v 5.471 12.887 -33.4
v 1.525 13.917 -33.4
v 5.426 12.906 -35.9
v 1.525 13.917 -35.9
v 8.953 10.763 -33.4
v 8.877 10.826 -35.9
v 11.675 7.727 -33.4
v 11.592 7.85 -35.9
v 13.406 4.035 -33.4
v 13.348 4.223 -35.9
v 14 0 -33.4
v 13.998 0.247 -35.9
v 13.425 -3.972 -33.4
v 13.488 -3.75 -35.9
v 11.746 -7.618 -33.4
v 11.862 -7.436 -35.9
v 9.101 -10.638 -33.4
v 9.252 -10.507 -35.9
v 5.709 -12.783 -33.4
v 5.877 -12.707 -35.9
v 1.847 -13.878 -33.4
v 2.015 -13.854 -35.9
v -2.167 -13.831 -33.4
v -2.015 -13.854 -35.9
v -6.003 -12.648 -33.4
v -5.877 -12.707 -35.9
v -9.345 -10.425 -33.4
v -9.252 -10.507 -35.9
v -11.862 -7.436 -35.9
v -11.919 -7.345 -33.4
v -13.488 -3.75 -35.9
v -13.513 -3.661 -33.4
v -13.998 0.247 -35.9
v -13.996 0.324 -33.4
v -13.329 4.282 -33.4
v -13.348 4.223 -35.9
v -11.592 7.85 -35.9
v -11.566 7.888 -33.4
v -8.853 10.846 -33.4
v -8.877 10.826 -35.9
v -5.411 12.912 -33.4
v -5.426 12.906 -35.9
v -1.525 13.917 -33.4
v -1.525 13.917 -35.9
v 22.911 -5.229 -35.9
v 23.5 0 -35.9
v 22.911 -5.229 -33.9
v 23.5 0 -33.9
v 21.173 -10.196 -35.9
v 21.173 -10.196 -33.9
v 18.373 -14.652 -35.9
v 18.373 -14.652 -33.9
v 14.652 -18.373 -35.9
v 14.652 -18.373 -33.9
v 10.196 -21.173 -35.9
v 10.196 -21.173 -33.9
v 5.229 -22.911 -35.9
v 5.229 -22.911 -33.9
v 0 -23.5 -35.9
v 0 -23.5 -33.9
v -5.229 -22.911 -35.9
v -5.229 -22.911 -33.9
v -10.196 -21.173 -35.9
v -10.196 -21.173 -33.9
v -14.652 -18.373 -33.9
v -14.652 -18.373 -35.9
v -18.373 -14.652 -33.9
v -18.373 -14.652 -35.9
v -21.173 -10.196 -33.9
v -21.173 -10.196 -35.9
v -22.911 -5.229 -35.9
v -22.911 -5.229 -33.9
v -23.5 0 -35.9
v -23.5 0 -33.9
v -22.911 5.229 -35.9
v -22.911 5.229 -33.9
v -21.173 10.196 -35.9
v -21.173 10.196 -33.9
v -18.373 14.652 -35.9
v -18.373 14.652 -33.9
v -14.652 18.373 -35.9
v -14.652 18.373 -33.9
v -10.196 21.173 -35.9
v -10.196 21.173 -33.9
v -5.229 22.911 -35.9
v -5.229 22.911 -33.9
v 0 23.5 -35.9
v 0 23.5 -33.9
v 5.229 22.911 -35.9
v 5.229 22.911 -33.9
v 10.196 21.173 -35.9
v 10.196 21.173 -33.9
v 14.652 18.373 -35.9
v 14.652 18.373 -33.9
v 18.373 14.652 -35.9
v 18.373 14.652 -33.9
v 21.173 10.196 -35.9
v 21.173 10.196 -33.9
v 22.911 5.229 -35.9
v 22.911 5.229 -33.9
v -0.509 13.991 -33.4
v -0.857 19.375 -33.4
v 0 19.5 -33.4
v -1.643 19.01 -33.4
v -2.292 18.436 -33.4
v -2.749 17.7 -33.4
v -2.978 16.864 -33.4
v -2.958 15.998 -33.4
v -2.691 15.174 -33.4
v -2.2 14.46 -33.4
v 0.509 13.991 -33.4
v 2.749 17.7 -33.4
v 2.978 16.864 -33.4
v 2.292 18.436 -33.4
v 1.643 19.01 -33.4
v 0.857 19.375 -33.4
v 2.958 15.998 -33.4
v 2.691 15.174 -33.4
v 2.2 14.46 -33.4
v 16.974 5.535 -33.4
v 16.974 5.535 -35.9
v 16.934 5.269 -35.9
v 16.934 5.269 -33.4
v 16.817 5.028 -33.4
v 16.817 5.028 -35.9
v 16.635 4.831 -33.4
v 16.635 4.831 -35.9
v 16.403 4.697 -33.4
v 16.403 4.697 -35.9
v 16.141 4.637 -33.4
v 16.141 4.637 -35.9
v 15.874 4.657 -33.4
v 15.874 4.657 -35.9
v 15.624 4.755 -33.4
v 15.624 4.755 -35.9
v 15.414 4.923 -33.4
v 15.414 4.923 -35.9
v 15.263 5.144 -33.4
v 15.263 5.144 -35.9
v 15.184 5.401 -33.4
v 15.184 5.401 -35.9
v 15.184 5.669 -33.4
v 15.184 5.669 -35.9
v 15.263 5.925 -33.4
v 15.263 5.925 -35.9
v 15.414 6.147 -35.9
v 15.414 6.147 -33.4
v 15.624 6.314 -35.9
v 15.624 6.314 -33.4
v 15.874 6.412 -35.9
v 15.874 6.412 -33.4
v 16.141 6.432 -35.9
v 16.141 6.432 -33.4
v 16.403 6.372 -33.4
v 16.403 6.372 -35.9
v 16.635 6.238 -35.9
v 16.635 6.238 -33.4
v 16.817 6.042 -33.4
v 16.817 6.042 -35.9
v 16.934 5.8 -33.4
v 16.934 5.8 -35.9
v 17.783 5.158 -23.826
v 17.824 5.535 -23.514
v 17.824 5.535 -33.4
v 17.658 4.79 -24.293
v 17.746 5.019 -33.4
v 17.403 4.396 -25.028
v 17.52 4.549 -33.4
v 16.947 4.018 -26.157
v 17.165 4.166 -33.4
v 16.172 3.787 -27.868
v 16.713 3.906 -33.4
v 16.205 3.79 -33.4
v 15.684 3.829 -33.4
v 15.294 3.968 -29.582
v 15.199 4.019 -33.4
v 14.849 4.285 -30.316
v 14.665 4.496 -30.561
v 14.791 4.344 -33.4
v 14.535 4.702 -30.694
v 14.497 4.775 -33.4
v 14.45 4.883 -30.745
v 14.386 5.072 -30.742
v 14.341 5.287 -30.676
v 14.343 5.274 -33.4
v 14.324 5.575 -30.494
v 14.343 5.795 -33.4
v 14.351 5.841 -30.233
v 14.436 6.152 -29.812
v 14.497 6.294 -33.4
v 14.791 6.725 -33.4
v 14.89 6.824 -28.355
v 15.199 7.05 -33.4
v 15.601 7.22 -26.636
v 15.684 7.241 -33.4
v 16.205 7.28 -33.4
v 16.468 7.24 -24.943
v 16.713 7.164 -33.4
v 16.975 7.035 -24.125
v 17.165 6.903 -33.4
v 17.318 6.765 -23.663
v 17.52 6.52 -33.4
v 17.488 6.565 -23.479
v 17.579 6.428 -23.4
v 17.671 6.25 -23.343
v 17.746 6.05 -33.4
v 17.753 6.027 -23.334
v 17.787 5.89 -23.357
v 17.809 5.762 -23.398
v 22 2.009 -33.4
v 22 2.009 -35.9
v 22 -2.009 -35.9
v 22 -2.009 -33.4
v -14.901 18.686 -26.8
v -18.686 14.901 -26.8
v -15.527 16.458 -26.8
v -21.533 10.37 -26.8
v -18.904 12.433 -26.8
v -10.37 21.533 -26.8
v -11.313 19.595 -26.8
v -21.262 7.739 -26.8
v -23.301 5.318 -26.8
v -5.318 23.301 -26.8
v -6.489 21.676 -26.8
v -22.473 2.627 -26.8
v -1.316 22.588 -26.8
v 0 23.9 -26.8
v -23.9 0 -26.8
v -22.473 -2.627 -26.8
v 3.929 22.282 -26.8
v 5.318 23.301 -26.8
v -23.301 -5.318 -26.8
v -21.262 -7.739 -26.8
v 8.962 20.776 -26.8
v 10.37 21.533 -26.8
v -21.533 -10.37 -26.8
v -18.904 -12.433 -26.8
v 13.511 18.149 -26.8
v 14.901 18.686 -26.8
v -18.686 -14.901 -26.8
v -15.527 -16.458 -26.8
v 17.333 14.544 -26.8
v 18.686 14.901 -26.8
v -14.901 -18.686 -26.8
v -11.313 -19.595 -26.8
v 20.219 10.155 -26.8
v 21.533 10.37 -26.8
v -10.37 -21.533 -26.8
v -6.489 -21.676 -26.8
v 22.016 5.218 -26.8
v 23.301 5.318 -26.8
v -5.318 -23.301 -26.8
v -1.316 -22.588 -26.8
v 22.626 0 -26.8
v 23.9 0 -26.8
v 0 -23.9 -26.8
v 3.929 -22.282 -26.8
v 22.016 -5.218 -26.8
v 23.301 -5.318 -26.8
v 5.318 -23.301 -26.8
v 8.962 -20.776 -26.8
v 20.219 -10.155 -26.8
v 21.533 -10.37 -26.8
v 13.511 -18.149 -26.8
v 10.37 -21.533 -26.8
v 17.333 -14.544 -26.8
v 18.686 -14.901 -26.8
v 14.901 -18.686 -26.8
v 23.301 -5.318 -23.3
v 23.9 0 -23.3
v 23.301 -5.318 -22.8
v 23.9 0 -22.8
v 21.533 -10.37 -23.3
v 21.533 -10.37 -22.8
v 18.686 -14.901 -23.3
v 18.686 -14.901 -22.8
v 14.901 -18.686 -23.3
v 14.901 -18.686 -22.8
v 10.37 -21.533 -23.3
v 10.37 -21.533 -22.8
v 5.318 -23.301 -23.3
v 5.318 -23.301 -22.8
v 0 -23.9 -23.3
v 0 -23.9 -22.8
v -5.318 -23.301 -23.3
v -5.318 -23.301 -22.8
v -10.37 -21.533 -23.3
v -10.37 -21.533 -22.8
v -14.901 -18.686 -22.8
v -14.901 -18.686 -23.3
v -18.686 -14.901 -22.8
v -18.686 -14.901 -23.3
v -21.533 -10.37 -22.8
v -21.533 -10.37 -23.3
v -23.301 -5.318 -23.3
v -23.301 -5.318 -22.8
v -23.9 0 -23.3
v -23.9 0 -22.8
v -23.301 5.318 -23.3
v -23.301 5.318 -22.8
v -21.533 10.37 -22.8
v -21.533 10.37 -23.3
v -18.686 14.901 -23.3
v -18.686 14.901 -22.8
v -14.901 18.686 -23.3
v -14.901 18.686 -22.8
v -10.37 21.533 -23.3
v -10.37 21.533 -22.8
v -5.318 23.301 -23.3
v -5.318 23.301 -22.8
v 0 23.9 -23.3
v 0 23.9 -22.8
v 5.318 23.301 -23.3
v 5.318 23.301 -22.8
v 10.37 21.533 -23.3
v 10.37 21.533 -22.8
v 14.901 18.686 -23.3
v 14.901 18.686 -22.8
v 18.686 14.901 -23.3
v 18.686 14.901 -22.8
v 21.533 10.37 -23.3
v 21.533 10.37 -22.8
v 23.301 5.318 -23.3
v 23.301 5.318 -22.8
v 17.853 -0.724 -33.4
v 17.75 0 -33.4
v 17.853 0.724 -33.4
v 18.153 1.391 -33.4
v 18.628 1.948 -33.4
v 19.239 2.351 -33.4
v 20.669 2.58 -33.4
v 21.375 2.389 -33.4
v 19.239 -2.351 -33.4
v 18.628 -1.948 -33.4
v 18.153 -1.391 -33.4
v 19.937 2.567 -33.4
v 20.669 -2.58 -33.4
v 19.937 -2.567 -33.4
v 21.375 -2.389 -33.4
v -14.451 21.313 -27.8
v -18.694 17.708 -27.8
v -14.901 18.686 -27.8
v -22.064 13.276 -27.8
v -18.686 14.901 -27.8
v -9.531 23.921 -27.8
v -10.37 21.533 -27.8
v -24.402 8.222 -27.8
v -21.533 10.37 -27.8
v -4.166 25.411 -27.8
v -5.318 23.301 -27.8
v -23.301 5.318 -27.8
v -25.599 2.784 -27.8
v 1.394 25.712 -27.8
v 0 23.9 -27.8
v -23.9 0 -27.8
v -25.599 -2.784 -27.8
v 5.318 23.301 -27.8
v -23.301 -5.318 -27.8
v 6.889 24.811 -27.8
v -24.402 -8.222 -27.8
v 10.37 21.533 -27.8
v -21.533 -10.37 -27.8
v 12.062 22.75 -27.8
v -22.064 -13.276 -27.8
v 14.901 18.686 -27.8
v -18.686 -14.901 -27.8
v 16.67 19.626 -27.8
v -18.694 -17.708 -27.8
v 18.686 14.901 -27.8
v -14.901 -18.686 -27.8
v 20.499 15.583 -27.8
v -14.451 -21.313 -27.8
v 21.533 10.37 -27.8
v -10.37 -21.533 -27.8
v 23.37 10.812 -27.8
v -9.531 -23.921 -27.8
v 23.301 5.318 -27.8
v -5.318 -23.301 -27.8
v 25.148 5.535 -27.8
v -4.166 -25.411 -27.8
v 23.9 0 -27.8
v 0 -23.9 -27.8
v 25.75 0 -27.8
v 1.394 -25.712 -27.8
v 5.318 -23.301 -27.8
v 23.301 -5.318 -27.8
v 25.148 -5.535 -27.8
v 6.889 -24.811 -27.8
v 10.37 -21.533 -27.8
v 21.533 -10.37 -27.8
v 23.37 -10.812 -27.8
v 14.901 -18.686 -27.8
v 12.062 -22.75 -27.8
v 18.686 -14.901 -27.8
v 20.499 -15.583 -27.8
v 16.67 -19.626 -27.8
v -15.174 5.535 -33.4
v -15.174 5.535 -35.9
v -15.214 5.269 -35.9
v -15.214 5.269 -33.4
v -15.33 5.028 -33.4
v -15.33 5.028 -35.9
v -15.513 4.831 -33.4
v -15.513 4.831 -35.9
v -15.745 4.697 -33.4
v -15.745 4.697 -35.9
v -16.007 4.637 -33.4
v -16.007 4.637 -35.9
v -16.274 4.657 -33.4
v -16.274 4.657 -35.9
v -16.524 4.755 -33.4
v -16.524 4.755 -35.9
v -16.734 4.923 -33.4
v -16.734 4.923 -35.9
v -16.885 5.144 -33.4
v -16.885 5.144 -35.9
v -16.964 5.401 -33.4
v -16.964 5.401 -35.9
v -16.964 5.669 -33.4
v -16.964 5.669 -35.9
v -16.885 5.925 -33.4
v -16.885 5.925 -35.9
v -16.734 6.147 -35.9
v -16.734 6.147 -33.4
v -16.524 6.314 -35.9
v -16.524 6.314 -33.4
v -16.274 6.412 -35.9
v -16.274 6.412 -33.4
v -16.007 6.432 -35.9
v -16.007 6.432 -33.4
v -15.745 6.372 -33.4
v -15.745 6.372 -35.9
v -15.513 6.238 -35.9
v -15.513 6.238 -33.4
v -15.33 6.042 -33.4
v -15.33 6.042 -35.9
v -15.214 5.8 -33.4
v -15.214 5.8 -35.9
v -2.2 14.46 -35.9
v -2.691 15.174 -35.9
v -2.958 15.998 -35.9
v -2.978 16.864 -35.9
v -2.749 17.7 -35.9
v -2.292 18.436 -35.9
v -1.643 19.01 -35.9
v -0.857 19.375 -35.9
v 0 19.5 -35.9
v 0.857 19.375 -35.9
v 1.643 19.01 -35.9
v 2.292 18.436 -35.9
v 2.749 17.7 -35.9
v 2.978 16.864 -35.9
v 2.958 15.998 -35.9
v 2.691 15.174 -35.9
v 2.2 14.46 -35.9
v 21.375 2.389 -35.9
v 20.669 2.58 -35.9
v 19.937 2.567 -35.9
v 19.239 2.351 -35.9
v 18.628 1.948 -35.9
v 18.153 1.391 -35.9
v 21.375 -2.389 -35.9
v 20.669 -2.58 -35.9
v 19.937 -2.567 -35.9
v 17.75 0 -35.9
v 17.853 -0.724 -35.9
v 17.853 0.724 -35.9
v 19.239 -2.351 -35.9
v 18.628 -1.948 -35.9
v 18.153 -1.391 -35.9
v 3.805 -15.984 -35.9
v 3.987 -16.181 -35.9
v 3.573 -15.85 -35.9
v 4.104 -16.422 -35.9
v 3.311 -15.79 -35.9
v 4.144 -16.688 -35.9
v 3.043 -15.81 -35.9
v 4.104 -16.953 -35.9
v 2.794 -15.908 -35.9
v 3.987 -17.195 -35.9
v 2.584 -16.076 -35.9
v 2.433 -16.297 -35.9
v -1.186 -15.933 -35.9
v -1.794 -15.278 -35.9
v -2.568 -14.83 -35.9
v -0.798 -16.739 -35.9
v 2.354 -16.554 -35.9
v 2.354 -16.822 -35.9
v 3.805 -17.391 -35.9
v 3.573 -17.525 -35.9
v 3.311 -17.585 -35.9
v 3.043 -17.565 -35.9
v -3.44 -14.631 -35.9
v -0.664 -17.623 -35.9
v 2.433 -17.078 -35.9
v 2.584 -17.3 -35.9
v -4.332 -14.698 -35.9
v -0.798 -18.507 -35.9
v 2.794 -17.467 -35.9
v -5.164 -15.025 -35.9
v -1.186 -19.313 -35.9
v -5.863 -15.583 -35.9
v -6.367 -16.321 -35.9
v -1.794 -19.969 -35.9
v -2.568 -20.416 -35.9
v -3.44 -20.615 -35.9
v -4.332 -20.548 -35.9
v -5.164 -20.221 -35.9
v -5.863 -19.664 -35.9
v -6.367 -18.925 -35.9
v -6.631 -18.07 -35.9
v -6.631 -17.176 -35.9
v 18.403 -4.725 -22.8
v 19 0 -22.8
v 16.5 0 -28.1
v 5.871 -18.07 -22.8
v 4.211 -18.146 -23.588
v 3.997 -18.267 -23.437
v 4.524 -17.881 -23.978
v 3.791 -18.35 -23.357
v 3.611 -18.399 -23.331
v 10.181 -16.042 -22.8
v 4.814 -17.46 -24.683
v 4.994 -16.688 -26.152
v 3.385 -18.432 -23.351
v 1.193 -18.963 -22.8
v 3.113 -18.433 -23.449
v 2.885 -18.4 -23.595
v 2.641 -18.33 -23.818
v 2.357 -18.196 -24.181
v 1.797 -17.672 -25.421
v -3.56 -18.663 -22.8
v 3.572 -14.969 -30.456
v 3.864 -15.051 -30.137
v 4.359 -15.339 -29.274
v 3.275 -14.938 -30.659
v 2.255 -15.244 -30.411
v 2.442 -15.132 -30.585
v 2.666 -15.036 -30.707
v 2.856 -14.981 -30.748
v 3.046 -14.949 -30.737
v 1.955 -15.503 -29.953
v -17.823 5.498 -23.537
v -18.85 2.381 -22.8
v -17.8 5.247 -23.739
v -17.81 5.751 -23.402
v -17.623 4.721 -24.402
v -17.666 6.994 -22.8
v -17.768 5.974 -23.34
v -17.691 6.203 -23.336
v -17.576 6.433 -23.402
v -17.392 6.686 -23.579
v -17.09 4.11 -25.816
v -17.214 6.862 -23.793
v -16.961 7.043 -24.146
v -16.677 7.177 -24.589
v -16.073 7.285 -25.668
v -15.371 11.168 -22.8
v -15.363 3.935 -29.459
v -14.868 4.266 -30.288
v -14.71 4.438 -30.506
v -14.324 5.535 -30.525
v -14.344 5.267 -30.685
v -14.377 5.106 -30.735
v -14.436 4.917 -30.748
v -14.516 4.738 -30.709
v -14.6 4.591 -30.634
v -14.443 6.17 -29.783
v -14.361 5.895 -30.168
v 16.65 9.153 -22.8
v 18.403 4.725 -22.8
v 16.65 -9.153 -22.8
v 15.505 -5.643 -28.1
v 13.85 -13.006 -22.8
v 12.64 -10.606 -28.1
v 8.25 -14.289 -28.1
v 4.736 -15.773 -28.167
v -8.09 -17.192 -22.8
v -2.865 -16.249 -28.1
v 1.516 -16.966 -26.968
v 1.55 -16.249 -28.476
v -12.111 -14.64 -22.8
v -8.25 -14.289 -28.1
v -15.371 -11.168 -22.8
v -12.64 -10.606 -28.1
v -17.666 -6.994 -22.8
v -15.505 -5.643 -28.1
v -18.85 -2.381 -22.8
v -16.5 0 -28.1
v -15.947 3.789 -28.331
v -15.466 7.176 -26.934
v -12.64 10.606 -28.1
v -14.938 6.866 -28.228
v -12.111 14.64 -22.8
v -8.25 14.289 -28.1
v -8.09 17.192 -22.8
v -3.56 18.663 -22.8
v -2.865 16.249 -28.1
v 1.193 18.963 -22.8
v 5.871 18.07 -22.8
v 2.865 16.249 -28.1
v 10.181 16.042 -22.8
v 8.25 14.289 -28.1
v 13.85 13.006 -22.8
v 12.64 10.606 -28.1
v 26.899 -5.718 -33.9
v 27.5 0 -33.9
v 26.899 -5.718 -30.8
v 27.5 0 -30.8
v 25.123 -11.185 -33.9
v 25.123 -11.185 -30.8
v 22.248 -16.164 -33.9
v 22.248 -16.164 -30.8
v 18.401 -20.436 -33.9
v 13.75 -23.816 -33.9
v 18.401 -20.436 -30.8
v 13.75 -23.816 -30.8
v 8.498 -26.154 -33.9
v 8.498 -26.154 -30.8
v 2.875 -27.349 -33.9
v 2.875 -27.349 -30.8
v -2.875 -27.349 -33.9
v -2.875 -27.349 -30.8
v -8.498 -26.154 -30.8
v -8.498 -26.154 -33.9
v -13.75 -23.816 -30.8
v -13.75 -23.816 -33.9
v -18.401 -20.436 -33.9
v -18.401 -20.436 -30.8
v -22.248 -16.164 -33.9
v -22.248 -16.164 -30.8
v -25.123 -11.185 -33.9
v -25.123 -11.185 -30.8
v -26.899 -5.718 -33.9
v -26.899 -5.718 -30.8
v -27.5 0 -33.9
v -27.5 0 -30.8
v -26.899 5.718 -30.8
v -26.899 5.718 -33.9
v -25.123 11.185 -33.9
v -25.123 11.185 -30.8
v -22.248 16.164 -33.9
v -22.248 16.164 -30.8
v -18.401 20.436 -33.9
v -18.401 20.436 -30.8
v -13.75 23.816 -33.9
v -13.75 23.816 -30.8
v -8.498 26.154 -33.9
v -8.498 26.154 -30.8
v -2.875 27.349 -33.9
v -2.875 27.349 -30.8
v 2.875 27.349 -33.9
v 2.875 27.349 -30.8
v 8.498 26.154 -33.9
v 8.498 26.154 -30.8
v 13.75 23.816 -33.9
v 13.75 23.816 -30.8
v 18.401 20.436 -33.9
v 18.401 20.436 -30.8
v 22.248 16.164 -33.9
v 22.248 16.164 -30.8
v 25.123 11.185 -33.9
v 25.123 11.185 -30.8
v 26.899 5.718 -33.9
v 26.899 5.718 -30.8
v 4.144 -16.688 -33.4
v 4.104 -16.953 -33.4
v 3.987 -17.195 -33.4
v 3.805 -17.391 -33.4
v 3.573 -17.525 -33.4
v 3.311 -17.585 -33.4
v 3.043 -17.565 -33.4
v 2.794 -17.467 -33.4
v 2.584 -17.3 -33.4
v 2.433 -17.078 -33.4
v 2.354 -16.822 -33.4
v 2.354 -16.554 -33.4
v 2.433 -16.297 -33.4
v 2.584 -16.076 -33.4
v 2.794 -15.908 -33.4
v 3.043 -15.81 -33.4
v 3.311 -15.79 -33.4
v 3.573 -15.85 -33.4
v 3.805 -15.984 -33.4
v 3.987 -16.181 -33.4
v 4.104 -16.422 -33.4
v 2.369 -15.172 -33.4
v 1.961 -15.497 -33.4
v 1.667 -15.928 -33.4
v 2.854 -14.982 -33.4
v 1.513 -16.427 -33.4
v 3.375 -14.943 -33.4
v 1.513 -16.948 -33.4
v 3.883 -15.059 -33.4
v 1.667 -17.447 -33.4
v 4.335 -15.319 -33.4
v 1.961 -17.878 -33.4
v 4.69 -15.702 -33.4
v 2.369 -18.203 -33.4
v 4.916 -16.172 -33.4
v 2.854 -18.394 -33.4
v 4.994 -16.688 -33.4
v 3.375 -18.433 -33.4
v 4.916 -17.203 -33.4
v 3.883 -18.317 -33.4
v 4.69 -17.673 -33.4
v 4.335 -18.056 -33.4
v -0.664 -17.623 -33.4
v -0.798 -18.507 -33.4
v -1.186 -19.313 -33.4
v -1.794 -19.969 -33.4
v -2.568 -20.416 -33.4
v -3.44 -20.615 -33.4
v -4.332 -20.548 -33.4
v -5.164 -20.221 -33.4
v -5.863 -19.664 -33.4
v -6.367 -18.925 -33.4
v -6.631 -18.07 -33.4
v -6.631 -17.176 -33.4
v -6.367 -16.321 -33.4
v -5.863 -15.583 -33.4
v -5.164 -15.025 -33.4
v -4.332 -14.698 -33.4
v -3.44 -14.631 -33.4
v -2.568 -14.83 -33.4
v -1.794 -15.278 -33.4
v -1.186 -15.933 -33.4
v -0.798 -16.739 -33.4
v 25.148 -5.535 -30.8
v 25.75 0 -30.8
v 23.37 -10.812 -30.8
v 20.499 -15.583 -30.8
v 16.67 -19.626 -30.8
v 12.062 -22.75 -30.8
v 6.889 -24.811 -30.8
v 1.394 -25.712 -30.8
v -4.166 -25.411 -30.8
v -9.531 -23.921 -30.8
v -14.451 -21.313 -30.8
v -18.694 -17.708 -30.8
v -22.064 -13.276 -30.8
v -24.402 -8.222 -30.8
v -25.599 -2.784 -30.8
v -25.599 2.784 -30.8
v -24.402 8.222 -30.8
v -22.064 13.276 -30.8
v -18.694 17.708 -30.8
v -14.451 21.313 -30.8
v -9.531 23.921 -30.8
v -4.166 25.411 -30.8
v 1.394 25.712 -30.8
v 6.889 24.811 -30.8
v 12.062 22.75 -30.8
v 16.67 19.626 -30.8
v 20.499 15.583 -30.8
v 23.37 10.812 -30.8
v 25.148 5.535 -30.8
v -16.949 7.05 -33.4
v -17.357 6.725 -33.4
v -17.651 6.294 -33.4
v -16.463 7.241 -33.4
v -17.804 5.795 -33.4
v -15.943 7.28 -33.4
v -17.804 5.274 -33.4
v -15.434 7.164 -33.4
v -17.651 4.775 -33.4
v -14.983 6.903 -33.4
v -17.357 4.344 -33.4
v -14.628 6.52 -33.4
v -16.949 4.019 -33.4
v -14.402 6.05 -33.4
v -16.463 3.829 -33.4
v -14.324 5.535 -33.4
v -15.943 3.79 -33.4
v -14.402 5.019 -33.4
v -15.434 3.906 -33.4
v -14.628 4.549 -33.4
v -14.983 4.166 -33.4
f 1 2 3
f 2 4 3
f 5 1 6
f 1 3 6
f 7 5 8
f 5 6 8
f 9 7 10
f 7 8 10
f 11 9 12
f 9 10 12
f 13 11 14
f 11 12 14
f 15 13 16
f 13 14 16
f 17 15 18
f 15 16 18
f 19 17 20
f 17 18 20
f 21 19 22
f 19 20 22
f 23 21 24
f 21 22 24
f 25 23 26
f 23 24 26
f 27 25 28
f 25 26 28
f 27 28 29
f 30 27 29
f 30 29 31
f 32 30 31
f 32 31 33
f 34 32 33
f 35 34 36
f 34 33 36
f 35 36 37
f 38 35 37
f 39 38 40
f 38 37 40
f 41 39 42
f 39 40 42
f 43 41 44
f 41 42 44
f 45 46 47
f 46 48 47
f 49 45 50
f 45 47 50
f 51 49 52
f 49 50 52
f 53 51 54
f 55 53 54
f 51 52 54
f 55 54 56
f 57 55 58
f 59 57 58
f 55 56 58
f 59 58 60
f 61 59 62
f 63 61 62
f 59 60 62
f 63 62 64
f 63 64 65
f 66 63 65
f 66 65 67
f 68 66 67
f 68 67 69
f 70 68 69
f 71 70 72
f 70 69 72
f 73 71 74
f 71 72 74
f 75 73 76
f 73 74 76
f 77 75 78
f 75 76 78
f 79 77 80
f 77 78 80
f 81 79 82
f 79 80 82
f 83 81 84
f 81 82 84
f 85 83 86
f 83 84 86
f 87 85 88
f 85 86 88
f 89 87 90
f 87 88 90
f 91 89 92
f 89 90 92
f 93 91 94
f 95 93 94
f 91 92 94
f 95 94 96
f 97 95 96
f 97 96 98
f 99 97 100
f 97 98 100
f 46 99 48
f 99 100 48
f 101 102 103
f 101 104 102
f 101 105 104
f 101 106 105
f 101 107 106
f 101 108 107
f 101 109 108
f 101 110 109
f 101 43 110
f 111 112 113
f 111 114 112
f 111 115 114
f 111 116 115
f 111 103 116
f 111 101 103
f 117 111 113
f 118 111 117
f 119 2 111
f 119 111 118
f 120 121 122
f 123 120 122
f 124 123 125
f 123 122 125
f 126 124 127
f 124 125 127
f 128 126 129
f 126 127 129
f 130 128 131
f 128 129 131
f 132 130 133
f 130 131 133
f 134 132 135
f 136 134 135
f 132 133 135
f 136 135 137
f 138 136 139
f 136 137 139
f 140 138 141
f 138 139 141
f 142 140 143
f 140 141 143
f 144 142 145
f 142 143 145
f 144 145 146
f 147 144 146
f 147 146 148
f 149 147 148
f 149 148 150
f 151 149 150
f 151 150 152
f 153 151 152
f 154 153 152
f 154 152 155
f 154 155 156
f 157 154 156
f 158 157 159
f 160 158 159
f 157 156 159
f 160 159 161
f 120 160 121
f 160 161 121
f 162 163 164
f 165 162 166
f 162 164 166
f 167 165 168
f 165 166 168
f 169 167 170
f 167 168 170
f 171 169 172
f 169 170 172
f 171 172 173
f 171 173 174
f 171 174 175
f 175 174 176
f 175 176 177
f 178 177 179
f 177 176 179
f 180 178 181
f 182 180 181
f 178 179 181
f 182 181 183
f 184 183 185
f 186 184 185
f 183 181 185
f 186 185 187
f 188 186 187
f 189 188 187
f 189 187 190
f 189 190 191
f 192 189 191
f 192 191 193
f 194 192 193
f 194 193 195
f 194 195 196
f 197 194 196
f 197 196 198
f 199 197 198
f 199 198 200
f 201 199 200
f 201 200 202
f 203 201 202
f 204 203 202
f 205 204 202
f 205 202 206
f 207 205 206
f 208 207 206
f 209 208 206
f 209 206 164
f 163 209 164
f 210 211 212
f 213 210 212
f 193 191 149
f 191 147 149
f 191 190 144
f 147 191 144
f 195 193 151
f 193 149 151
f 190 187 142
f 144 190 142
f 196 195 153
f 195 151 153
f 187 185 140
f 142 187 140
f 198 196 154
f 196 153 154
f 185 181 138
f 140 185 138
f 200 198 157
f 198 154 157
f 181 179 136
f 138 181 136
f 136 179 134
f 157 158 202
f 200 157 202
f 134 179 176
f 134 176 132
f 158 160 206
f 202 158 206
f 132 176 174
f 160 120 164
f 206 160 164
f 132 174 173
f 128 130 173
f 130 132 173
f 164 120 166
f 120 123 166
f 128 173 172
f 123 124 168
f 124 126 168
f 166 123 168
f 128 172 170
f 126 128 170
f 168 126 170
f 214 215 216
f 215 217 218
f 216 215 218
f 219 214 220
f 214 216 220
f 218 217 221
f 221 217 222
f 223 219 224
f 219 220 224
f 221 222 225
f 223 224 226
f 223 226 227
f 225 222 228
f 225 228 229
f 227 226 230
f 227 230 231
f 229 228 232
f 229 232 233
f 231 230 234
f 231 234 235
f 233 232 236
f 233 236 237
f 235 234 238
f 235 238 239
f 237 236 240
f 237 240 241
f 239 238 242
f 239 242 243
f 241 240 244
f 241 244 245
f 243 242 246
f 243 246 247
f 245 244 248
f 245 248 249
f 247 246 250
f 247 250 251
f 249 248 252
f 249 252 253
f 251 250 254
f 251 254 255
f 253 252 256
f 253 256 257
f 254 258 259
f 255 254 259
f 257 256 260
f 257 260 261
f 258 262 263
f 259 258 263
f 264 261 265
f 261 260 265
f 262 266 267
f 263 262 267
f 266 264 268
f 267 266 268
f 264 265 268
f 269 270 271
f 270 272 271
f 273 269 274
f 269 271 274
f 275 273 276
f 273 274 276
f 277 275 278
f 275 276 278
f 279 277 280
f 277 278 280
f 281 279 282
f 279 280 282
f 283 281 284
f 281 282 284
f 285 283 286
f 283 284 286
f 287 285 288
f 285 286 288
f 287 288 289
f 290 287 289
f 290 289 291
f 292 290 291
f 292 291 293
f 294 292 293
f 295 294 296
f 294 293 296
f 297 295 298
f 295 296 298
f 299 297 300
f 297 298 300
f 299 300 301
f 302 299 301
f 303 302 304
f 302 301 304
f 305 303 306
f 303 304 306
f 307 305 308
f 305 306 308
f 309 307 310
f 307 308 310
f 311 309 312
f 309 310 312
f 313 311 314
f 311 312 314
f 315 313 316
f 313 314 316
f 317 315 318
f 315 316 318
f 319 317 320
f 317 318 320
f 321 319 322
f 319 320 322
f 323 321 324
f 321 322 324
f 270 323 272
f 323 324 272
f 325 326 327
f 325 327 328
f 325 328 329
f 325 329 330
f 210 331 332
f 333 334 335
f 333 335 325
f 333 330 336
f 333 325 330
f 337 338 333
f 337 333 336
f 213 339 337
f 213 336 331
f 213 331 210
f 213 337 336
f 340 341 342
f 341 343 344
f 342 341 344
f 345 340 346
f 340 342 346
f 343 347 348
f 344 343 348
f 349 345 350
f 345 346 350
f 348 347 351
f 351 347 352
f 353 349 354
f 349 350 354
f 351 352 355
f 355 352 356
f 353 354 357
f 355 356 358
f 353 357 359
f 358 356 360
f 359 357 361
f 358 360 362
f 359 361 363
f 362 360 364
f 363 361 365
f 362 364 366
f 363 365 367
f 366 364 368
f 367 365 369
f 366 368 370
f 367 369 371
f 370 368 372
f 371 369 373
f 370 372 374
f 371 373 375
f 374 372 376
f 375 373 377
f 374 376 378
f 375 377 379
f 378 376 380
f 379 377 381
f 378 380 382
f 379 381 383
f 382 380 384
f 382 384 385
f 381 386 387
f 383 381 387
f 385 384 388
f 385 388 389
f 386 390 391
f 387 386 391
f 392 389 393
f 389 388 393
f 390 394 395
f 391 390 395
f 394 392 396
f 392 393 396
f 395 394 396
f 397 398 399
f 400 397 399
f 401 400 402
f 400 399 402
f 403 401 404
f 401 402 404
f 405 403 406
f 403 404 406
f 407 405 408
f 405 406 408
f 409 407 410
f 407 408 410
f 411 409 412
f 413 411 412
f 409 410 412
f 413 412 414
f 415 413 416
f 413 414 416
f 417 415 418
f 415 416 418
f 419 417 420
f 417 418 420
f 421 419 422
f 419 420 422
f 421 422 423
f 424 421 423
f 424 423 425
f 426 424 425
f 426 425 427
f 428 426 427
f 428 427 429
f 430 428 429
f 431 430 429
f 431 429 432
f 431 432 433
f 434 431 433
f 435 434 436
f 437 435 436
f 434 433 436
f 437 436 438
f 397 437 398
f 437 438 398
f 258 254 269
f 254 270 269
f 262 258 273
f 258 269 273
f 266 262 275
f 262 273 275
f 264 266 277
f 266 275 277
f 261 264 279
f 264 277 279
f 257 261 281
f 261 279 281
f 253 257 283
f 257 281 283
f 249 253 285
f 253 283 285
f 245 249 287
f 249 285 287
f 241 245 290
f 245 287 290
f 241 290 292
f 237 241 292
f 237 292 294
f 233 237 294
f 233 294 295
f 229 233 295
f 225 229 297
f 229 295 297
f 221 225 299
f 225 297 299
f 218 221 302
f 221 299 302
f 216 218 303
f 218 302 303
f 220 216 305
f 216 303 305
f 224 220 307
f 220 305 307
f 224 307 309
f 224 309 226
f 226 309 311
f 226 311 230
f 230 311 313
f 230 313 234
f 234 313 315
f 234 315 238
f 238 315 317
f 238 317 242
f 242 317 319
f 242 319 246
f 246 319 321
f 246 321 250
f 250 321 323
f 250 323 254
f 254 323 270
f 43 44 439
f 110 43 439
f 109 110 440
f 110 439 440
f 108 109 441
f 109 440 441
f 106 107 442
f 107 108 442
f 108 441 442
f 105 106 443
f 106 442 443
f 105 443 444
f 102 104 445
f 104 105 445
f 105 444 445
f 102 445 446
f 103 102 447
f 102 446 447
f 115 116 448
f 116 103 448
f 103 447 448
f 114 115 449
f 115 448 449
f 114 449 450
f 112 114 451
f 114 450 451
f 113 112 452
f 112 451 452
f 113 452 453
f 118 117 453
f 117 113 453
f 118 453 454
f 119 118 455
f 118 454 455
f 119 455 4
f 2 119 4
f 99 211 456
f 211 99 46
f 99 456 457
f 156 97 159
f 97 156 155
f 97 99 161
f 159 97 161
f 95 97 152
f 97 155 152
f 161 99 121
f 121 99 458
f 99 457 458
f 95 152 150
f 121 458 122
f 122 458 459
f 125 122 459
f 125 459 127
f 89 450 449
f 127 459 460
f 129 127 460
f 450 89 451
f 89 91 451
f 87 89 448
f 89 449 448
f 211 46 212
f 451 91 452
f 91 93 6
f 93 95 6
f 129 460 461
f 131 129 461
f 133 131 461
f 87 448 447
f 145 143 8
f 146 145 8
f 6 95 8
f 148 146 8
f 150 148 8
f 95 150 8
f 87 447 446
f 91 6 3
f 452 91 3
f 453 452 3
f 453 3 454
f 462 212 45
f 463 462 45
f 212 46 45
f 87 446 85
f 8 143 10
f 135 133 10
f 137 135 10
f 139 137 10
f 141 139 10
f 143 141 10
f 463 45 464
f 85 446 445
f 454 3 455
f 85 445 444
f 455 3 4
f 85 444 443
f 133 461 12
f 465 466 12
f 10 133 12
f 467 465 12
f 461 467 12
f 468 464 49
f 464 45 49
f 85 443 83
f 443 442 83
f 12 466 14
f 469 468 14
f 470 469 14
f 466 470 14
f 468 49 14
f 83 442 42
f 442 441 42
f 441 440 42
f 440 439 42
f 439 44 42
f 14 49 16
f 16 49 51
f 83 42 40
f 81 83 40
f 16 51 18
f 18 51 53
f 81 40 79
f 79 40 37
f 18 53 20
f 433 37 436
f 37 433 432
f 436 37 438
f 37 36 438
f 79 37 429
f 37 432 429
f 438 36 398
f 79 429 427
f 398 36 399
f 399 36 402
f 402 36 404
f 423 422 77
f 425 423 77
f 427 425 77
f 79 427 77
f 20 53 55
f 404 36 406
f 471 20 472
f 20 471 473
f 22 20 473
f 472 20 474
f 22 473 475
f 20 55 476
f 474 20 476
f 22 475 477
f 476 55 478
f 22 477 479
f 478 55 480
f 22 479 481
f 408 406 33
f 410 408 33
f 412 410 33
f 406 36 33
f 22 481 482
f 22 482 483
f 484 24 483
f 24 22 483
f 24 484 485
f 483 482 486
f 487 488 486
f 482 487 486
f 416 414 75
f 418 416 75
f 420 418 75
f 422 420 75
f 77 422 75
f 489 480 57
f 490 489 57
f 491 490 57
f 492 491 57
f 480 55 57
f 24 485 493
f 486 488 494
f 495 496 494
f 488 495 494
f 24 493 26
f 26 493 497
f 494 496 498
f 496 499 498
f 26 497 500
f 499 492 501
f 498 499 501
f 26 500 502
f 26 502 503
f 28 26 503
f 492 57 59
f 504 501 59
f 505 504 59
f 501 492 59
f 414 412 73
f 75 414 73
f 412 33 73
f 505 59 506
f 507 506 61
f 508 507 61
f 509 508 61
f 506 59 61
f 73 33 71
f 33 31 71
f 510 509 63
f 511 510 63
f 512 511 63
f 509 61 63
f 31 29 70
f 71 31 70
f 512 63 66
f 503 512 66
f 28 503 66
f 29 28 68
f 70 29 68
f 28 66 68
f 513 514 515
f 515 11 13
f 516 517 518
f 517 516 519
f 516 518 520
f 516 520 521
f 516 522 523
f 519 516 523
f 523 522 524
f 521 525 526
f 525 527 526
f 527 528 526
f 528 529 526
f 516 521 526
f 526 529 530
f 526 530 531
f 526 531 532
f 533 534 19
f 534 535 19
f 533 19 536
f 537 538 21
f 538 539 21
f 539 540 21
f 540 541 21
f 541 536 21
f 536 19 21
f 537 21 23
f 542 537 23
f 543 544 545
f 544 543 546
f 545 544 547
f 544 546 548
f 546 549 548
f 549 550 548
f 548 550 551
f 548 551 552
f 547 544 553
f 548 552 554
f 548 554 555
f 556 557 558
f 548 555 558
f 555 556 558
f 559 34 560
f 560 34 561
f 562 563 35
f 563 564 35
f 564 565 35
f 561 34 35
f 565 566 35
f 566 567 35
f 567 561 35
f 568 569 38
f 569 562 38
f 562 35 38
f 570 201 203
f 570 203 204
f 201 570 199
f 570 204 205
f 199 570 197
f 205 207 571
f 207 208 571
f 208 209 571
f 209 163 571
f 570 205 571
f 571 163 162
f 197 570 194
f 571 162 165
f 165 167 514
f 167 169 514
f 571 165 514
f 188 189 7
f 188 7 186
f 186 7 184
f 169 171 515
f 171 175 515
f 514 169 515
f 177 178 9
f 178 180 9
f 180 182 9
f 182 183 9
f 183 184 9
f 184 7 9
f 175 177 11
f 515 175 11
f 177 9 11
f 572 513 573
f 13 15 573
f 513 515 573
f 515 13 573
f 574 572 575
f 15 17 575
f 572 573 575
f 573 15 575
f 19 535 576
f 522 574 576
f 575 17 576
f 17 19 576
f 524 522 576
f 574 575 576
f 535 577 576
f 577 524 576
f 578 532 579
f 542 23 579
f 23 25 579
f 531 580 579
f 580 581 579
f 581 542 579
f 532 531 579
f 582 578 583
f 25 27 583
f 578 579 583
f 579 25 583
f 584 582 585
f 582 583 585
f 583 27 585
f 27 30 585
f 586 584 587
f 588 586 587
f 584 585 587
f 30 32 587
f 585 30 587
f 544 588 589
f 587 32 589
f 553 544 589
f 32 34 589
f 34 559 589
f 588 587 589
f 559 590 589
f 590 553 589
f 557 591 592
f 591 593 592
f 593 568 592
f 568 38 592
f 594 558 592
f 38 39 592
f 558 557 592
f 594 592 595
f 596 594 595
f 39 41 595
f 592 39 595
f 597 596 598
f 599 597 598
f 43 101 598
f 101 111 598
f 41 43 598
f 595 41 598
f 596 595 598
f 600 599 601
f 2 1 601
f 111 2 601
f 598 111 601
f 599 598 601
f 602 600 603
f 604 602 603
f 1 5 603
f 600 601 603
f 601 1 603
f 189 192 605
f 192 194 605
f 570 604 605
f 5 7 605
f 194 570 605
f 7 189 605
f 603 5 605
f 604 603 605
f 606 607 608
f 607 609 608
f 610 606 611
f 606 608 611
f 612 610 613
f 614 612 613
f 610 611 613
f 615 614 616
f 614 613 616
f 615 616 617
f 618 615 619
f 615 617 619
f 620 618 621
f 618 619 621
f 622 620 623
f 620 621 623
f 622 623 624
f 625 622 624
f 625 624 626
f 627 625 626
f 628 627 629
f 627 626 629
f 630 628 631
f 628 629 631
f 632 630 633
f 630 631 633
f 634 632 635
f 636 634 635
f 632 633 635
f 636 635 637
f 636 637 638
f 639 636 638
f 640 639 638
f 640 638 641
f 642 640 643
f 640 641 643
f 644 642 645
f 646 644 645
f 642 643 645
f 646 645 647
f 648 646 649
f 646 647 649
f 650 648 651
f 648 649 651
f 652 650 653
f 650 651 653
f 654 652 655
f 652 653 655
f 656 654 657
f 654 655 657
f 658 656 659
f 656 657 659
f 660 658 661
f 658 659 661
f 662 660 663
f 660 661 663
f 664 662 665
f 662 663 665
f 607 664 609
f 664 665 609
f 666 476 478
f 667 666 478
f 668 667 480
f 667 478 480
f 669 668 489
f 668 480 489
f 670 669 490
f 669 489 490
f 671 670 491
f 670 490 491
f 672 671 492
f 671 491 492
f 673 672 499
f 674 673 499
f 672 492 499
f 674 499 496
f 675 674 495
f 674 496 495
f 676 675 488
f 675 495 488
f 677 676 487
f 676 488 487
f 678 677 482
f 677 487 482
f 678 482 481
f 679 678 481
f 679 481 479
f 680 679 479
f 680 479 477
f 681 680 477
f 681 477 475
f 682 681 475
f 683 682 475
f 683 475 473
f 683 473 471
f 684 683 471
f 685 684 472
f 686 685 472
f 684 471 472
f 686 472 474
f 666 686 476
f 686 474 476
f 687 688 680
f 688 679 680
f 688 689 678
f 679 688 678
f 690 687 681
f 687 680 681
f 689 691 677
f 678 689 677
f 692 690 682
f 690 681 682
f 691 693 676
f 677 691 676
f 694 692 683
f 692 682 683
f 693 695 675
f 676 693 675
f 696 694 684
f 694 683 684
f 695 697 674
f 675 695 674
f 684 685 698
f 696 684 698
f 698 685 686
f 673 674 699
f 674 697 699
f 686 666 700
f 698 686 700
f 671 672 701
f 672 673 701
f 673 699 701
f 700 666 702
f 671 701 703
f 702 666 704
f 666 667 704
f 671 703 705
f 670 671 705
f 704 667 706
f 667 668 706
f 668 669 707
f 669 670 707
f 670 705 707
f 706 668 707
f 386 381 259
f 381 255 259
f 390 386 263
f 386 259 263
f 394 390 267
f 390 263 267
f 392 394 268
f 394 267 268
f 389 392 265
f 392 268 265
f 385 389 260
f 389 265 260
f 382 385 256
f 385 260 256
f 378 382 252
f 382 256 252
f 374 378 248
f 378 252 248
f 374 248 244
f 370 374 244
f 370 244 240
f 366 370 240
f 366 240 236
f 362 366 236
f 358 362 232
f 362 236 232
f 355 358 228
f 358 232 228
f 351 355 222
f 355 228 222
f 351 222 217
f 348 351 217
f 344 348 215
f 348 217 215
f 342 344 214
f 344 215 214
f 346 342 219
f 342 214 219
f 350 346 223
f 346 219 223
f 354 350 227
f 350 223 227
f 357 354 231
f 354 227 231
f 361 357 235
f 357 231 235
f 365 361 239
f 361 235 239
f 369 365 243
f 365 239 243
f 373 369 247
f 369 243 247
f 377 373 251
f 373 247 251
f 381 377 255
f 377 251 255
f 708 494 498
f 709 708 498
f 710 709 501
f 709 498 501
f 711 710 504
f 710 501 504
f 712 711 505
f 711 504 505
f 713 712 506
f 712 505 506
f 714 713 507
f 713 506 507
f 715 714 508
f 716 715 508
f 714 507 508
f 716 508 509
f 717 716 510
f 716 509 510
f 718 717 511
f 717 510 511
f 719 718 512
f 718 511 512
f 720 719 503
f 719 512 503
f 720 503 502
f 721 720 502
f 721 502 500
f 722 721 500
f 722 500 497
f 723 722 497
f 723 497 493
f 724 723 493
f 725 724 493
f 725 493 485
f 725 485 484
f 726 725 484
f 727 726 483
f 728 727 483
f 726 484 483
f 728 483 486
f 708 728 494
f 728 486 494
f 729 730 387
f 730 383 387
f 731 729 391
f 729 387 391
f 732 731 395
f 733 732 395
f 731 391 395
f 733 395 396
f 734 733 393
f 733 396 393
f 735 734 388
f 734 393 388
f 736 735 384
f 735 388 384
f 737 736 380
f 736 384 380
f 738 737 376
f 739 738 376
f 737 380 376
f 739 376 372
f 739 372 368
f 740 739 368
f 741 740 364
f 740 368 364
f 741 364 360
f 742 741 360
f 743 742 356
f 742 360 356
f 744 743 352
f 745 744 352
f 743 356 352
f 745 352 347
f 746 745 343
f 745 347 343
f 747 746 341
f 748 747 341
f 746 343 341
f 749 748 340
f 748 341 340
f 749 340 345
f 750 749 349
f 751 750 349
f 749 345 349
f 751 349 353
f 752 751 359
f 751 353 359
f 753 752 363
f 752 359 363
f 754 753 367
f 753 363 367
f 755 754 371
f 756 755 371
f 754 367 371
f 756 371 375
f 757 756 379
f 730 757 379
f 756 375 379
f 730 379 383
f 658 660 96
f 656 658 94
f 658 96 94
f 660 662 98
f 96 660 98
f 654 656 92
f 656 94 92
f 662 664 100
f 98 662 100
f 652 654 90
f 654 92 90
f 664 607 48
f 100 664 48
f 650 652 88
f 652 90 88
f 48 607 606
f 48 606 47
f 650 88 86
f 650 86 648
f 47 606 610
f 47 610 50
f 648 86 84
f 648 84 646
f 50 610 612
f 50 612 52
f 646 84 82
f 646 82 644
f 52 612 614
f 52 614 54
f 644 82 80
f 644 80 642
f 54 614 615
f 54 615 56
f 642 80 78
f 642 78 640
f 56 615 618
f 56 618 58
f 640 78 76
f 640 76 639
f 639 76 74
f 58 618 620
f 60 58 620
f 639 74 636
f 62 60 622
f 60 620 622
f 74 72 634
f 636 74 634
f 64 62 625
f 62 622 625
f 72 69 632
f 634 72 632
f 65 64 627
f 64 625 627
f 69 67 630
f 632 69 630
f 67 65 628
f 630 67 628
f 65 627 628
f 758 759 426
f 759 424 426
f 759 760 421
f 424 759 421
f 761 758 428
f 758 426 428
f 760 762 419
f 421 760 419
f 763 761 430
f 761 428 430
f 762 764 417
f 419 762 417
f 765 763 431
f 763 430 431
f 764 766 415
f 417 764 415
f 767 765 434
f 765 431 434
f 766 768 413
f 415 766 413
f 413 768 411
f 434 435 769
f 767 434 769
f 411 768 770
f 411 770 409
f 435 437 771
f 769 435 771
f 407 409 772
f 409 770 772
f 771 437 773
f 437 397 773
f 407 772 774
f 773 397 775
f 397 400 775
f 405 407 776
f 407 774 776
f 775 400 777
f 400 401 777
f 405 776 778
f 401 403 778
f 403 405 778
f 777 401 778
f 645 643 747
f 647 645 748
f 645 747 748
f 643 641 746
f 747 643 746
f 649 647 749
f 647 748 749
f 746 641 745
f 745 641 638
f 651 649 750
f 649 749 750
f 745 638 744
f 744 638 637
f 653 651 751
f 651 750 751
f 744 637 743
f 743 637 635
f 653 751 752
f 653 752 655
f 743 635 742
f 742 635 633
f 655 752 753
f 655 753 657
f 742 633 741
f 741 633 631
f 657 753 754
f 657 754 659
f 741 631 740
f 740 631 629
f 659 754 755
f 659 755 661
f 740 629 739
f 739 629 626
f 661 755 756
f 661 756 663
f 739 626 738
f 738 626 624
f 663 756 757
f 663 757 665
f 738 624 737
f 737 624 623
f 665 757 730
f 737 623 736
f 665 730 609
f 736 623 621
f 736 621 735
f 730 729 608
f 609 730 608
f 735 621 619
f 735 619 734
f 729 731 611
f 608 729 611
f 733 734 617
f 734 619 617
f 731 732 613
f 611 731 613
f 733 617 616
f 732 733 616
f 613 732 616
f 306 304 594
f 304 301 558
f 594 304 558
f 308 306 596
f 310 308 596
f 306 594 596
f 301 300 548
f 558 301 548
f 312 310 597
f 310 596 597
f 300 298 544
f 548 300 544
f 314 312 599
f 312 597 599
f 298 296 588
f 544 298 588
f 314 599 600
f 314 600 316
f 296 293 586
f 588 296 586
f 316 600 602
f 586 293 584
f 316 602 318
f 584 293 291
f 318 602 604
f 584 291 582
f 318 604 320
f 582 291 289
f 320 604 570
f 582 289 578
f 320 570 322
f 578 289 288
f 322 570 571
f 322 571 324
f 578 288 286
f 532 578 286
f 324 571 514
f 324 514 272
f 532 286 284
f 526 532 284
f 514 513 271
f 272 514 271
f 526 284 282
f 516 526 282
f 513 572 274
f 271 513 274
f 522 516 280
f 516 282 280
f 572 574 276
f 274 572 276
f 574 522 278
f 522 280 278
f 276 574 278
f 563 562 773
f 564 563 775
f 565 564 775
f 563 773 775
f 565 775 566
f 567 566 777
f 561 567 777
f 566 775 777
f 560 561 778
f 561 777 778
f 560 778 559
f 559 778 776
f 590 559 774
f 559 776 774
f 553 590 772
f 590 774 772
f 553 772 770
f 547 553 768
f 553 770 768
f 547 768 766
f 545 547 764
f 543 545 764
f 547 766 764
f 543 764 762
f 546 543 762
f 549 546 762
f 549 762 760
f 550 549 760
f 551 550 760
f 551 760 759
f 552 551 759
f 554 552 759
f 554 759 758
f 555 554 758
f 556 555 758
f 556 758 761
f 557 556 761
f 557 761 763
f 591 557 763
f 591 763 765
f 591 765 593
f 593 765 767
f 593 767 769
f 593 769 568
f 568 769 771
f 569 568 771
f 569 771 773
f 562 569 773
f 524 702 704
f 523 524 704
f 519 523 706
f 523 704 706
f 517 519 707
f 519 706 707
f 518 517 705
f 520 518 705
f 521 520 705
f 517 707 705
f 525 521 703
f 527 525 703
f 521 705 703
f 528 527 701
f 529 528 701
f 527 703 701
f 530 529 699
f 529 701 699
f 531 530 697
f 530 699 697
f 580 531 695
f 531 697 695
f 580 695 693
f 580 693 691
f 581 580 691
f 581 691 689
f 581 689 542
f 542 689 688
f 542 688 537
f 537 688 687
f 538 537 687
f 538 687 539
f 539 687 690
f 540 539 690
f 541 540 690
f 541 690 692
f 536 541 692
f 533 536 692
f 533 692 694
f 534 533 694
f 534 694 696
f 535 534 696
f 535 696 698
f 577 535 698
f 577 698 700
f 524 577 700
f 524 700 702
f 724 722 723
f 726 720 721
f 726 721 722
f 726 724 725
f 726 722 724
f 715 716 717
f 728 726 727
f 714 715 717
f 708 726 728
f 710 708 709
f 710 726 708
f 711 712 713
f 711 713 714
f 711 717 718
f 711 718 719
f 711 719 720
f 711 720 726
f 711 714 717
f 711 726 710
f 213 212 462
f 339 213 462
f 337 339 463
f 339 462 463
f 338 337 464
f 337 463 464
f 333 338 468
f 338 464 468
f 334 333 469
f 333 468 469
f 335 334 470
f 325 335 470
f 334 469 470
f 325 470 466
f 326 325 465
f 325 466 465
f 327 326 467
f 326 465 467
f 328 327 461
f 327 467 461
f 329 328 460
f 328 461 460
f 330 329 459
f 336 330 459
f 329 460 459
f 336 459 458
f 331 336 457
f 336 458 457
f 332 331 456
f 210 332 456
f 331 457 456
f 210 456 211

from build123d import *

# Parameters (mm, degrees)
F2_R     = 0.9
F3_DEPTH = 2.5
F4_R     = 3
F5_DEPTH = 2.5
F6_R     = 1.75
F7_DEPTH = 10.0710001


with BuildPart() as f1:
    # F0 (on Front) → F1 (revolve)
    with BuildSketch(Plane.XZ):
        Polygon((14, -35.9), (23.5, -35.9), (23.5, -33.9), (27.5, -33.9), (27.5, -30.8), (25.75, -30.8), (25.75, -27.8), (23.9, -27.8), (23.9, -26.8), (22.6261041801, -26.8), (23.9, -23.3), (23.9, -22.8), (19, -22.8), (14, -33.4), align=None)
    revolve(axis=Axis((0, 0, -3.8875962891), (0, 0, -1)))

    # F2 (on face) → F3 (cut)
    with BuildSketch(Plane(origin=(0, 0, -35.9), x_dir=(1, 0, 0), z_dir=(0, 0, -1))):
        with Locations((3.2437529214, 16.6876621186)):
            Circle(F2_R)
        with Locations((16.0738157852, -5.5346586258)):
            Circle(F2_R)
        with Locations((-16.0738157852, -5.5346586258)):
            Circle(F2_R)
    extrude(amount=-F3_DEPTH, mode=Mode.SUBTRACT)

    # F4 (on face) → F5 (cut)
    with BuildSketch(Plane(origin=(0, 0, -35.9), x_dir=(1, 0, 0), z_dir=(0, 0, -1))):
        with BuildLine():
            Line((22, -2.0093531297), (22, 2.0093531297))
            ThreePointArc((22, 2.0093531297), (17.75, 0), (22, -2.0093531297))
        make_face()
        with Locations((-3.6643229153, 17.6230740103)):
            Circle(F4_R)
        with Locations((0, -16.5)):
            Circle(F4_R)
    extrude(amount=-F5_DEPTH, mode=Mode.SUBTRACT)

    # F6 (on face) → F7 (cut, through all)
    with BuildSketch(Plane(origin=(0, 0, -33.4), x_dir=(1, 0, 0), z_dir=(0, 0, -1))):
        with Locations((3.2437529214, 16.6876621186)):
            Circle(F6_R)
        with Locations((-16.0738157852, -5.5346586258)):
            Circle(F6_R)
        with Locations((16.0738157852, -5.5346586258)):
            Circle(F6_R)
    extrude(amount=-F7_DEPTH, mode=Mode.SUBTRACT)


solid = f1.part
